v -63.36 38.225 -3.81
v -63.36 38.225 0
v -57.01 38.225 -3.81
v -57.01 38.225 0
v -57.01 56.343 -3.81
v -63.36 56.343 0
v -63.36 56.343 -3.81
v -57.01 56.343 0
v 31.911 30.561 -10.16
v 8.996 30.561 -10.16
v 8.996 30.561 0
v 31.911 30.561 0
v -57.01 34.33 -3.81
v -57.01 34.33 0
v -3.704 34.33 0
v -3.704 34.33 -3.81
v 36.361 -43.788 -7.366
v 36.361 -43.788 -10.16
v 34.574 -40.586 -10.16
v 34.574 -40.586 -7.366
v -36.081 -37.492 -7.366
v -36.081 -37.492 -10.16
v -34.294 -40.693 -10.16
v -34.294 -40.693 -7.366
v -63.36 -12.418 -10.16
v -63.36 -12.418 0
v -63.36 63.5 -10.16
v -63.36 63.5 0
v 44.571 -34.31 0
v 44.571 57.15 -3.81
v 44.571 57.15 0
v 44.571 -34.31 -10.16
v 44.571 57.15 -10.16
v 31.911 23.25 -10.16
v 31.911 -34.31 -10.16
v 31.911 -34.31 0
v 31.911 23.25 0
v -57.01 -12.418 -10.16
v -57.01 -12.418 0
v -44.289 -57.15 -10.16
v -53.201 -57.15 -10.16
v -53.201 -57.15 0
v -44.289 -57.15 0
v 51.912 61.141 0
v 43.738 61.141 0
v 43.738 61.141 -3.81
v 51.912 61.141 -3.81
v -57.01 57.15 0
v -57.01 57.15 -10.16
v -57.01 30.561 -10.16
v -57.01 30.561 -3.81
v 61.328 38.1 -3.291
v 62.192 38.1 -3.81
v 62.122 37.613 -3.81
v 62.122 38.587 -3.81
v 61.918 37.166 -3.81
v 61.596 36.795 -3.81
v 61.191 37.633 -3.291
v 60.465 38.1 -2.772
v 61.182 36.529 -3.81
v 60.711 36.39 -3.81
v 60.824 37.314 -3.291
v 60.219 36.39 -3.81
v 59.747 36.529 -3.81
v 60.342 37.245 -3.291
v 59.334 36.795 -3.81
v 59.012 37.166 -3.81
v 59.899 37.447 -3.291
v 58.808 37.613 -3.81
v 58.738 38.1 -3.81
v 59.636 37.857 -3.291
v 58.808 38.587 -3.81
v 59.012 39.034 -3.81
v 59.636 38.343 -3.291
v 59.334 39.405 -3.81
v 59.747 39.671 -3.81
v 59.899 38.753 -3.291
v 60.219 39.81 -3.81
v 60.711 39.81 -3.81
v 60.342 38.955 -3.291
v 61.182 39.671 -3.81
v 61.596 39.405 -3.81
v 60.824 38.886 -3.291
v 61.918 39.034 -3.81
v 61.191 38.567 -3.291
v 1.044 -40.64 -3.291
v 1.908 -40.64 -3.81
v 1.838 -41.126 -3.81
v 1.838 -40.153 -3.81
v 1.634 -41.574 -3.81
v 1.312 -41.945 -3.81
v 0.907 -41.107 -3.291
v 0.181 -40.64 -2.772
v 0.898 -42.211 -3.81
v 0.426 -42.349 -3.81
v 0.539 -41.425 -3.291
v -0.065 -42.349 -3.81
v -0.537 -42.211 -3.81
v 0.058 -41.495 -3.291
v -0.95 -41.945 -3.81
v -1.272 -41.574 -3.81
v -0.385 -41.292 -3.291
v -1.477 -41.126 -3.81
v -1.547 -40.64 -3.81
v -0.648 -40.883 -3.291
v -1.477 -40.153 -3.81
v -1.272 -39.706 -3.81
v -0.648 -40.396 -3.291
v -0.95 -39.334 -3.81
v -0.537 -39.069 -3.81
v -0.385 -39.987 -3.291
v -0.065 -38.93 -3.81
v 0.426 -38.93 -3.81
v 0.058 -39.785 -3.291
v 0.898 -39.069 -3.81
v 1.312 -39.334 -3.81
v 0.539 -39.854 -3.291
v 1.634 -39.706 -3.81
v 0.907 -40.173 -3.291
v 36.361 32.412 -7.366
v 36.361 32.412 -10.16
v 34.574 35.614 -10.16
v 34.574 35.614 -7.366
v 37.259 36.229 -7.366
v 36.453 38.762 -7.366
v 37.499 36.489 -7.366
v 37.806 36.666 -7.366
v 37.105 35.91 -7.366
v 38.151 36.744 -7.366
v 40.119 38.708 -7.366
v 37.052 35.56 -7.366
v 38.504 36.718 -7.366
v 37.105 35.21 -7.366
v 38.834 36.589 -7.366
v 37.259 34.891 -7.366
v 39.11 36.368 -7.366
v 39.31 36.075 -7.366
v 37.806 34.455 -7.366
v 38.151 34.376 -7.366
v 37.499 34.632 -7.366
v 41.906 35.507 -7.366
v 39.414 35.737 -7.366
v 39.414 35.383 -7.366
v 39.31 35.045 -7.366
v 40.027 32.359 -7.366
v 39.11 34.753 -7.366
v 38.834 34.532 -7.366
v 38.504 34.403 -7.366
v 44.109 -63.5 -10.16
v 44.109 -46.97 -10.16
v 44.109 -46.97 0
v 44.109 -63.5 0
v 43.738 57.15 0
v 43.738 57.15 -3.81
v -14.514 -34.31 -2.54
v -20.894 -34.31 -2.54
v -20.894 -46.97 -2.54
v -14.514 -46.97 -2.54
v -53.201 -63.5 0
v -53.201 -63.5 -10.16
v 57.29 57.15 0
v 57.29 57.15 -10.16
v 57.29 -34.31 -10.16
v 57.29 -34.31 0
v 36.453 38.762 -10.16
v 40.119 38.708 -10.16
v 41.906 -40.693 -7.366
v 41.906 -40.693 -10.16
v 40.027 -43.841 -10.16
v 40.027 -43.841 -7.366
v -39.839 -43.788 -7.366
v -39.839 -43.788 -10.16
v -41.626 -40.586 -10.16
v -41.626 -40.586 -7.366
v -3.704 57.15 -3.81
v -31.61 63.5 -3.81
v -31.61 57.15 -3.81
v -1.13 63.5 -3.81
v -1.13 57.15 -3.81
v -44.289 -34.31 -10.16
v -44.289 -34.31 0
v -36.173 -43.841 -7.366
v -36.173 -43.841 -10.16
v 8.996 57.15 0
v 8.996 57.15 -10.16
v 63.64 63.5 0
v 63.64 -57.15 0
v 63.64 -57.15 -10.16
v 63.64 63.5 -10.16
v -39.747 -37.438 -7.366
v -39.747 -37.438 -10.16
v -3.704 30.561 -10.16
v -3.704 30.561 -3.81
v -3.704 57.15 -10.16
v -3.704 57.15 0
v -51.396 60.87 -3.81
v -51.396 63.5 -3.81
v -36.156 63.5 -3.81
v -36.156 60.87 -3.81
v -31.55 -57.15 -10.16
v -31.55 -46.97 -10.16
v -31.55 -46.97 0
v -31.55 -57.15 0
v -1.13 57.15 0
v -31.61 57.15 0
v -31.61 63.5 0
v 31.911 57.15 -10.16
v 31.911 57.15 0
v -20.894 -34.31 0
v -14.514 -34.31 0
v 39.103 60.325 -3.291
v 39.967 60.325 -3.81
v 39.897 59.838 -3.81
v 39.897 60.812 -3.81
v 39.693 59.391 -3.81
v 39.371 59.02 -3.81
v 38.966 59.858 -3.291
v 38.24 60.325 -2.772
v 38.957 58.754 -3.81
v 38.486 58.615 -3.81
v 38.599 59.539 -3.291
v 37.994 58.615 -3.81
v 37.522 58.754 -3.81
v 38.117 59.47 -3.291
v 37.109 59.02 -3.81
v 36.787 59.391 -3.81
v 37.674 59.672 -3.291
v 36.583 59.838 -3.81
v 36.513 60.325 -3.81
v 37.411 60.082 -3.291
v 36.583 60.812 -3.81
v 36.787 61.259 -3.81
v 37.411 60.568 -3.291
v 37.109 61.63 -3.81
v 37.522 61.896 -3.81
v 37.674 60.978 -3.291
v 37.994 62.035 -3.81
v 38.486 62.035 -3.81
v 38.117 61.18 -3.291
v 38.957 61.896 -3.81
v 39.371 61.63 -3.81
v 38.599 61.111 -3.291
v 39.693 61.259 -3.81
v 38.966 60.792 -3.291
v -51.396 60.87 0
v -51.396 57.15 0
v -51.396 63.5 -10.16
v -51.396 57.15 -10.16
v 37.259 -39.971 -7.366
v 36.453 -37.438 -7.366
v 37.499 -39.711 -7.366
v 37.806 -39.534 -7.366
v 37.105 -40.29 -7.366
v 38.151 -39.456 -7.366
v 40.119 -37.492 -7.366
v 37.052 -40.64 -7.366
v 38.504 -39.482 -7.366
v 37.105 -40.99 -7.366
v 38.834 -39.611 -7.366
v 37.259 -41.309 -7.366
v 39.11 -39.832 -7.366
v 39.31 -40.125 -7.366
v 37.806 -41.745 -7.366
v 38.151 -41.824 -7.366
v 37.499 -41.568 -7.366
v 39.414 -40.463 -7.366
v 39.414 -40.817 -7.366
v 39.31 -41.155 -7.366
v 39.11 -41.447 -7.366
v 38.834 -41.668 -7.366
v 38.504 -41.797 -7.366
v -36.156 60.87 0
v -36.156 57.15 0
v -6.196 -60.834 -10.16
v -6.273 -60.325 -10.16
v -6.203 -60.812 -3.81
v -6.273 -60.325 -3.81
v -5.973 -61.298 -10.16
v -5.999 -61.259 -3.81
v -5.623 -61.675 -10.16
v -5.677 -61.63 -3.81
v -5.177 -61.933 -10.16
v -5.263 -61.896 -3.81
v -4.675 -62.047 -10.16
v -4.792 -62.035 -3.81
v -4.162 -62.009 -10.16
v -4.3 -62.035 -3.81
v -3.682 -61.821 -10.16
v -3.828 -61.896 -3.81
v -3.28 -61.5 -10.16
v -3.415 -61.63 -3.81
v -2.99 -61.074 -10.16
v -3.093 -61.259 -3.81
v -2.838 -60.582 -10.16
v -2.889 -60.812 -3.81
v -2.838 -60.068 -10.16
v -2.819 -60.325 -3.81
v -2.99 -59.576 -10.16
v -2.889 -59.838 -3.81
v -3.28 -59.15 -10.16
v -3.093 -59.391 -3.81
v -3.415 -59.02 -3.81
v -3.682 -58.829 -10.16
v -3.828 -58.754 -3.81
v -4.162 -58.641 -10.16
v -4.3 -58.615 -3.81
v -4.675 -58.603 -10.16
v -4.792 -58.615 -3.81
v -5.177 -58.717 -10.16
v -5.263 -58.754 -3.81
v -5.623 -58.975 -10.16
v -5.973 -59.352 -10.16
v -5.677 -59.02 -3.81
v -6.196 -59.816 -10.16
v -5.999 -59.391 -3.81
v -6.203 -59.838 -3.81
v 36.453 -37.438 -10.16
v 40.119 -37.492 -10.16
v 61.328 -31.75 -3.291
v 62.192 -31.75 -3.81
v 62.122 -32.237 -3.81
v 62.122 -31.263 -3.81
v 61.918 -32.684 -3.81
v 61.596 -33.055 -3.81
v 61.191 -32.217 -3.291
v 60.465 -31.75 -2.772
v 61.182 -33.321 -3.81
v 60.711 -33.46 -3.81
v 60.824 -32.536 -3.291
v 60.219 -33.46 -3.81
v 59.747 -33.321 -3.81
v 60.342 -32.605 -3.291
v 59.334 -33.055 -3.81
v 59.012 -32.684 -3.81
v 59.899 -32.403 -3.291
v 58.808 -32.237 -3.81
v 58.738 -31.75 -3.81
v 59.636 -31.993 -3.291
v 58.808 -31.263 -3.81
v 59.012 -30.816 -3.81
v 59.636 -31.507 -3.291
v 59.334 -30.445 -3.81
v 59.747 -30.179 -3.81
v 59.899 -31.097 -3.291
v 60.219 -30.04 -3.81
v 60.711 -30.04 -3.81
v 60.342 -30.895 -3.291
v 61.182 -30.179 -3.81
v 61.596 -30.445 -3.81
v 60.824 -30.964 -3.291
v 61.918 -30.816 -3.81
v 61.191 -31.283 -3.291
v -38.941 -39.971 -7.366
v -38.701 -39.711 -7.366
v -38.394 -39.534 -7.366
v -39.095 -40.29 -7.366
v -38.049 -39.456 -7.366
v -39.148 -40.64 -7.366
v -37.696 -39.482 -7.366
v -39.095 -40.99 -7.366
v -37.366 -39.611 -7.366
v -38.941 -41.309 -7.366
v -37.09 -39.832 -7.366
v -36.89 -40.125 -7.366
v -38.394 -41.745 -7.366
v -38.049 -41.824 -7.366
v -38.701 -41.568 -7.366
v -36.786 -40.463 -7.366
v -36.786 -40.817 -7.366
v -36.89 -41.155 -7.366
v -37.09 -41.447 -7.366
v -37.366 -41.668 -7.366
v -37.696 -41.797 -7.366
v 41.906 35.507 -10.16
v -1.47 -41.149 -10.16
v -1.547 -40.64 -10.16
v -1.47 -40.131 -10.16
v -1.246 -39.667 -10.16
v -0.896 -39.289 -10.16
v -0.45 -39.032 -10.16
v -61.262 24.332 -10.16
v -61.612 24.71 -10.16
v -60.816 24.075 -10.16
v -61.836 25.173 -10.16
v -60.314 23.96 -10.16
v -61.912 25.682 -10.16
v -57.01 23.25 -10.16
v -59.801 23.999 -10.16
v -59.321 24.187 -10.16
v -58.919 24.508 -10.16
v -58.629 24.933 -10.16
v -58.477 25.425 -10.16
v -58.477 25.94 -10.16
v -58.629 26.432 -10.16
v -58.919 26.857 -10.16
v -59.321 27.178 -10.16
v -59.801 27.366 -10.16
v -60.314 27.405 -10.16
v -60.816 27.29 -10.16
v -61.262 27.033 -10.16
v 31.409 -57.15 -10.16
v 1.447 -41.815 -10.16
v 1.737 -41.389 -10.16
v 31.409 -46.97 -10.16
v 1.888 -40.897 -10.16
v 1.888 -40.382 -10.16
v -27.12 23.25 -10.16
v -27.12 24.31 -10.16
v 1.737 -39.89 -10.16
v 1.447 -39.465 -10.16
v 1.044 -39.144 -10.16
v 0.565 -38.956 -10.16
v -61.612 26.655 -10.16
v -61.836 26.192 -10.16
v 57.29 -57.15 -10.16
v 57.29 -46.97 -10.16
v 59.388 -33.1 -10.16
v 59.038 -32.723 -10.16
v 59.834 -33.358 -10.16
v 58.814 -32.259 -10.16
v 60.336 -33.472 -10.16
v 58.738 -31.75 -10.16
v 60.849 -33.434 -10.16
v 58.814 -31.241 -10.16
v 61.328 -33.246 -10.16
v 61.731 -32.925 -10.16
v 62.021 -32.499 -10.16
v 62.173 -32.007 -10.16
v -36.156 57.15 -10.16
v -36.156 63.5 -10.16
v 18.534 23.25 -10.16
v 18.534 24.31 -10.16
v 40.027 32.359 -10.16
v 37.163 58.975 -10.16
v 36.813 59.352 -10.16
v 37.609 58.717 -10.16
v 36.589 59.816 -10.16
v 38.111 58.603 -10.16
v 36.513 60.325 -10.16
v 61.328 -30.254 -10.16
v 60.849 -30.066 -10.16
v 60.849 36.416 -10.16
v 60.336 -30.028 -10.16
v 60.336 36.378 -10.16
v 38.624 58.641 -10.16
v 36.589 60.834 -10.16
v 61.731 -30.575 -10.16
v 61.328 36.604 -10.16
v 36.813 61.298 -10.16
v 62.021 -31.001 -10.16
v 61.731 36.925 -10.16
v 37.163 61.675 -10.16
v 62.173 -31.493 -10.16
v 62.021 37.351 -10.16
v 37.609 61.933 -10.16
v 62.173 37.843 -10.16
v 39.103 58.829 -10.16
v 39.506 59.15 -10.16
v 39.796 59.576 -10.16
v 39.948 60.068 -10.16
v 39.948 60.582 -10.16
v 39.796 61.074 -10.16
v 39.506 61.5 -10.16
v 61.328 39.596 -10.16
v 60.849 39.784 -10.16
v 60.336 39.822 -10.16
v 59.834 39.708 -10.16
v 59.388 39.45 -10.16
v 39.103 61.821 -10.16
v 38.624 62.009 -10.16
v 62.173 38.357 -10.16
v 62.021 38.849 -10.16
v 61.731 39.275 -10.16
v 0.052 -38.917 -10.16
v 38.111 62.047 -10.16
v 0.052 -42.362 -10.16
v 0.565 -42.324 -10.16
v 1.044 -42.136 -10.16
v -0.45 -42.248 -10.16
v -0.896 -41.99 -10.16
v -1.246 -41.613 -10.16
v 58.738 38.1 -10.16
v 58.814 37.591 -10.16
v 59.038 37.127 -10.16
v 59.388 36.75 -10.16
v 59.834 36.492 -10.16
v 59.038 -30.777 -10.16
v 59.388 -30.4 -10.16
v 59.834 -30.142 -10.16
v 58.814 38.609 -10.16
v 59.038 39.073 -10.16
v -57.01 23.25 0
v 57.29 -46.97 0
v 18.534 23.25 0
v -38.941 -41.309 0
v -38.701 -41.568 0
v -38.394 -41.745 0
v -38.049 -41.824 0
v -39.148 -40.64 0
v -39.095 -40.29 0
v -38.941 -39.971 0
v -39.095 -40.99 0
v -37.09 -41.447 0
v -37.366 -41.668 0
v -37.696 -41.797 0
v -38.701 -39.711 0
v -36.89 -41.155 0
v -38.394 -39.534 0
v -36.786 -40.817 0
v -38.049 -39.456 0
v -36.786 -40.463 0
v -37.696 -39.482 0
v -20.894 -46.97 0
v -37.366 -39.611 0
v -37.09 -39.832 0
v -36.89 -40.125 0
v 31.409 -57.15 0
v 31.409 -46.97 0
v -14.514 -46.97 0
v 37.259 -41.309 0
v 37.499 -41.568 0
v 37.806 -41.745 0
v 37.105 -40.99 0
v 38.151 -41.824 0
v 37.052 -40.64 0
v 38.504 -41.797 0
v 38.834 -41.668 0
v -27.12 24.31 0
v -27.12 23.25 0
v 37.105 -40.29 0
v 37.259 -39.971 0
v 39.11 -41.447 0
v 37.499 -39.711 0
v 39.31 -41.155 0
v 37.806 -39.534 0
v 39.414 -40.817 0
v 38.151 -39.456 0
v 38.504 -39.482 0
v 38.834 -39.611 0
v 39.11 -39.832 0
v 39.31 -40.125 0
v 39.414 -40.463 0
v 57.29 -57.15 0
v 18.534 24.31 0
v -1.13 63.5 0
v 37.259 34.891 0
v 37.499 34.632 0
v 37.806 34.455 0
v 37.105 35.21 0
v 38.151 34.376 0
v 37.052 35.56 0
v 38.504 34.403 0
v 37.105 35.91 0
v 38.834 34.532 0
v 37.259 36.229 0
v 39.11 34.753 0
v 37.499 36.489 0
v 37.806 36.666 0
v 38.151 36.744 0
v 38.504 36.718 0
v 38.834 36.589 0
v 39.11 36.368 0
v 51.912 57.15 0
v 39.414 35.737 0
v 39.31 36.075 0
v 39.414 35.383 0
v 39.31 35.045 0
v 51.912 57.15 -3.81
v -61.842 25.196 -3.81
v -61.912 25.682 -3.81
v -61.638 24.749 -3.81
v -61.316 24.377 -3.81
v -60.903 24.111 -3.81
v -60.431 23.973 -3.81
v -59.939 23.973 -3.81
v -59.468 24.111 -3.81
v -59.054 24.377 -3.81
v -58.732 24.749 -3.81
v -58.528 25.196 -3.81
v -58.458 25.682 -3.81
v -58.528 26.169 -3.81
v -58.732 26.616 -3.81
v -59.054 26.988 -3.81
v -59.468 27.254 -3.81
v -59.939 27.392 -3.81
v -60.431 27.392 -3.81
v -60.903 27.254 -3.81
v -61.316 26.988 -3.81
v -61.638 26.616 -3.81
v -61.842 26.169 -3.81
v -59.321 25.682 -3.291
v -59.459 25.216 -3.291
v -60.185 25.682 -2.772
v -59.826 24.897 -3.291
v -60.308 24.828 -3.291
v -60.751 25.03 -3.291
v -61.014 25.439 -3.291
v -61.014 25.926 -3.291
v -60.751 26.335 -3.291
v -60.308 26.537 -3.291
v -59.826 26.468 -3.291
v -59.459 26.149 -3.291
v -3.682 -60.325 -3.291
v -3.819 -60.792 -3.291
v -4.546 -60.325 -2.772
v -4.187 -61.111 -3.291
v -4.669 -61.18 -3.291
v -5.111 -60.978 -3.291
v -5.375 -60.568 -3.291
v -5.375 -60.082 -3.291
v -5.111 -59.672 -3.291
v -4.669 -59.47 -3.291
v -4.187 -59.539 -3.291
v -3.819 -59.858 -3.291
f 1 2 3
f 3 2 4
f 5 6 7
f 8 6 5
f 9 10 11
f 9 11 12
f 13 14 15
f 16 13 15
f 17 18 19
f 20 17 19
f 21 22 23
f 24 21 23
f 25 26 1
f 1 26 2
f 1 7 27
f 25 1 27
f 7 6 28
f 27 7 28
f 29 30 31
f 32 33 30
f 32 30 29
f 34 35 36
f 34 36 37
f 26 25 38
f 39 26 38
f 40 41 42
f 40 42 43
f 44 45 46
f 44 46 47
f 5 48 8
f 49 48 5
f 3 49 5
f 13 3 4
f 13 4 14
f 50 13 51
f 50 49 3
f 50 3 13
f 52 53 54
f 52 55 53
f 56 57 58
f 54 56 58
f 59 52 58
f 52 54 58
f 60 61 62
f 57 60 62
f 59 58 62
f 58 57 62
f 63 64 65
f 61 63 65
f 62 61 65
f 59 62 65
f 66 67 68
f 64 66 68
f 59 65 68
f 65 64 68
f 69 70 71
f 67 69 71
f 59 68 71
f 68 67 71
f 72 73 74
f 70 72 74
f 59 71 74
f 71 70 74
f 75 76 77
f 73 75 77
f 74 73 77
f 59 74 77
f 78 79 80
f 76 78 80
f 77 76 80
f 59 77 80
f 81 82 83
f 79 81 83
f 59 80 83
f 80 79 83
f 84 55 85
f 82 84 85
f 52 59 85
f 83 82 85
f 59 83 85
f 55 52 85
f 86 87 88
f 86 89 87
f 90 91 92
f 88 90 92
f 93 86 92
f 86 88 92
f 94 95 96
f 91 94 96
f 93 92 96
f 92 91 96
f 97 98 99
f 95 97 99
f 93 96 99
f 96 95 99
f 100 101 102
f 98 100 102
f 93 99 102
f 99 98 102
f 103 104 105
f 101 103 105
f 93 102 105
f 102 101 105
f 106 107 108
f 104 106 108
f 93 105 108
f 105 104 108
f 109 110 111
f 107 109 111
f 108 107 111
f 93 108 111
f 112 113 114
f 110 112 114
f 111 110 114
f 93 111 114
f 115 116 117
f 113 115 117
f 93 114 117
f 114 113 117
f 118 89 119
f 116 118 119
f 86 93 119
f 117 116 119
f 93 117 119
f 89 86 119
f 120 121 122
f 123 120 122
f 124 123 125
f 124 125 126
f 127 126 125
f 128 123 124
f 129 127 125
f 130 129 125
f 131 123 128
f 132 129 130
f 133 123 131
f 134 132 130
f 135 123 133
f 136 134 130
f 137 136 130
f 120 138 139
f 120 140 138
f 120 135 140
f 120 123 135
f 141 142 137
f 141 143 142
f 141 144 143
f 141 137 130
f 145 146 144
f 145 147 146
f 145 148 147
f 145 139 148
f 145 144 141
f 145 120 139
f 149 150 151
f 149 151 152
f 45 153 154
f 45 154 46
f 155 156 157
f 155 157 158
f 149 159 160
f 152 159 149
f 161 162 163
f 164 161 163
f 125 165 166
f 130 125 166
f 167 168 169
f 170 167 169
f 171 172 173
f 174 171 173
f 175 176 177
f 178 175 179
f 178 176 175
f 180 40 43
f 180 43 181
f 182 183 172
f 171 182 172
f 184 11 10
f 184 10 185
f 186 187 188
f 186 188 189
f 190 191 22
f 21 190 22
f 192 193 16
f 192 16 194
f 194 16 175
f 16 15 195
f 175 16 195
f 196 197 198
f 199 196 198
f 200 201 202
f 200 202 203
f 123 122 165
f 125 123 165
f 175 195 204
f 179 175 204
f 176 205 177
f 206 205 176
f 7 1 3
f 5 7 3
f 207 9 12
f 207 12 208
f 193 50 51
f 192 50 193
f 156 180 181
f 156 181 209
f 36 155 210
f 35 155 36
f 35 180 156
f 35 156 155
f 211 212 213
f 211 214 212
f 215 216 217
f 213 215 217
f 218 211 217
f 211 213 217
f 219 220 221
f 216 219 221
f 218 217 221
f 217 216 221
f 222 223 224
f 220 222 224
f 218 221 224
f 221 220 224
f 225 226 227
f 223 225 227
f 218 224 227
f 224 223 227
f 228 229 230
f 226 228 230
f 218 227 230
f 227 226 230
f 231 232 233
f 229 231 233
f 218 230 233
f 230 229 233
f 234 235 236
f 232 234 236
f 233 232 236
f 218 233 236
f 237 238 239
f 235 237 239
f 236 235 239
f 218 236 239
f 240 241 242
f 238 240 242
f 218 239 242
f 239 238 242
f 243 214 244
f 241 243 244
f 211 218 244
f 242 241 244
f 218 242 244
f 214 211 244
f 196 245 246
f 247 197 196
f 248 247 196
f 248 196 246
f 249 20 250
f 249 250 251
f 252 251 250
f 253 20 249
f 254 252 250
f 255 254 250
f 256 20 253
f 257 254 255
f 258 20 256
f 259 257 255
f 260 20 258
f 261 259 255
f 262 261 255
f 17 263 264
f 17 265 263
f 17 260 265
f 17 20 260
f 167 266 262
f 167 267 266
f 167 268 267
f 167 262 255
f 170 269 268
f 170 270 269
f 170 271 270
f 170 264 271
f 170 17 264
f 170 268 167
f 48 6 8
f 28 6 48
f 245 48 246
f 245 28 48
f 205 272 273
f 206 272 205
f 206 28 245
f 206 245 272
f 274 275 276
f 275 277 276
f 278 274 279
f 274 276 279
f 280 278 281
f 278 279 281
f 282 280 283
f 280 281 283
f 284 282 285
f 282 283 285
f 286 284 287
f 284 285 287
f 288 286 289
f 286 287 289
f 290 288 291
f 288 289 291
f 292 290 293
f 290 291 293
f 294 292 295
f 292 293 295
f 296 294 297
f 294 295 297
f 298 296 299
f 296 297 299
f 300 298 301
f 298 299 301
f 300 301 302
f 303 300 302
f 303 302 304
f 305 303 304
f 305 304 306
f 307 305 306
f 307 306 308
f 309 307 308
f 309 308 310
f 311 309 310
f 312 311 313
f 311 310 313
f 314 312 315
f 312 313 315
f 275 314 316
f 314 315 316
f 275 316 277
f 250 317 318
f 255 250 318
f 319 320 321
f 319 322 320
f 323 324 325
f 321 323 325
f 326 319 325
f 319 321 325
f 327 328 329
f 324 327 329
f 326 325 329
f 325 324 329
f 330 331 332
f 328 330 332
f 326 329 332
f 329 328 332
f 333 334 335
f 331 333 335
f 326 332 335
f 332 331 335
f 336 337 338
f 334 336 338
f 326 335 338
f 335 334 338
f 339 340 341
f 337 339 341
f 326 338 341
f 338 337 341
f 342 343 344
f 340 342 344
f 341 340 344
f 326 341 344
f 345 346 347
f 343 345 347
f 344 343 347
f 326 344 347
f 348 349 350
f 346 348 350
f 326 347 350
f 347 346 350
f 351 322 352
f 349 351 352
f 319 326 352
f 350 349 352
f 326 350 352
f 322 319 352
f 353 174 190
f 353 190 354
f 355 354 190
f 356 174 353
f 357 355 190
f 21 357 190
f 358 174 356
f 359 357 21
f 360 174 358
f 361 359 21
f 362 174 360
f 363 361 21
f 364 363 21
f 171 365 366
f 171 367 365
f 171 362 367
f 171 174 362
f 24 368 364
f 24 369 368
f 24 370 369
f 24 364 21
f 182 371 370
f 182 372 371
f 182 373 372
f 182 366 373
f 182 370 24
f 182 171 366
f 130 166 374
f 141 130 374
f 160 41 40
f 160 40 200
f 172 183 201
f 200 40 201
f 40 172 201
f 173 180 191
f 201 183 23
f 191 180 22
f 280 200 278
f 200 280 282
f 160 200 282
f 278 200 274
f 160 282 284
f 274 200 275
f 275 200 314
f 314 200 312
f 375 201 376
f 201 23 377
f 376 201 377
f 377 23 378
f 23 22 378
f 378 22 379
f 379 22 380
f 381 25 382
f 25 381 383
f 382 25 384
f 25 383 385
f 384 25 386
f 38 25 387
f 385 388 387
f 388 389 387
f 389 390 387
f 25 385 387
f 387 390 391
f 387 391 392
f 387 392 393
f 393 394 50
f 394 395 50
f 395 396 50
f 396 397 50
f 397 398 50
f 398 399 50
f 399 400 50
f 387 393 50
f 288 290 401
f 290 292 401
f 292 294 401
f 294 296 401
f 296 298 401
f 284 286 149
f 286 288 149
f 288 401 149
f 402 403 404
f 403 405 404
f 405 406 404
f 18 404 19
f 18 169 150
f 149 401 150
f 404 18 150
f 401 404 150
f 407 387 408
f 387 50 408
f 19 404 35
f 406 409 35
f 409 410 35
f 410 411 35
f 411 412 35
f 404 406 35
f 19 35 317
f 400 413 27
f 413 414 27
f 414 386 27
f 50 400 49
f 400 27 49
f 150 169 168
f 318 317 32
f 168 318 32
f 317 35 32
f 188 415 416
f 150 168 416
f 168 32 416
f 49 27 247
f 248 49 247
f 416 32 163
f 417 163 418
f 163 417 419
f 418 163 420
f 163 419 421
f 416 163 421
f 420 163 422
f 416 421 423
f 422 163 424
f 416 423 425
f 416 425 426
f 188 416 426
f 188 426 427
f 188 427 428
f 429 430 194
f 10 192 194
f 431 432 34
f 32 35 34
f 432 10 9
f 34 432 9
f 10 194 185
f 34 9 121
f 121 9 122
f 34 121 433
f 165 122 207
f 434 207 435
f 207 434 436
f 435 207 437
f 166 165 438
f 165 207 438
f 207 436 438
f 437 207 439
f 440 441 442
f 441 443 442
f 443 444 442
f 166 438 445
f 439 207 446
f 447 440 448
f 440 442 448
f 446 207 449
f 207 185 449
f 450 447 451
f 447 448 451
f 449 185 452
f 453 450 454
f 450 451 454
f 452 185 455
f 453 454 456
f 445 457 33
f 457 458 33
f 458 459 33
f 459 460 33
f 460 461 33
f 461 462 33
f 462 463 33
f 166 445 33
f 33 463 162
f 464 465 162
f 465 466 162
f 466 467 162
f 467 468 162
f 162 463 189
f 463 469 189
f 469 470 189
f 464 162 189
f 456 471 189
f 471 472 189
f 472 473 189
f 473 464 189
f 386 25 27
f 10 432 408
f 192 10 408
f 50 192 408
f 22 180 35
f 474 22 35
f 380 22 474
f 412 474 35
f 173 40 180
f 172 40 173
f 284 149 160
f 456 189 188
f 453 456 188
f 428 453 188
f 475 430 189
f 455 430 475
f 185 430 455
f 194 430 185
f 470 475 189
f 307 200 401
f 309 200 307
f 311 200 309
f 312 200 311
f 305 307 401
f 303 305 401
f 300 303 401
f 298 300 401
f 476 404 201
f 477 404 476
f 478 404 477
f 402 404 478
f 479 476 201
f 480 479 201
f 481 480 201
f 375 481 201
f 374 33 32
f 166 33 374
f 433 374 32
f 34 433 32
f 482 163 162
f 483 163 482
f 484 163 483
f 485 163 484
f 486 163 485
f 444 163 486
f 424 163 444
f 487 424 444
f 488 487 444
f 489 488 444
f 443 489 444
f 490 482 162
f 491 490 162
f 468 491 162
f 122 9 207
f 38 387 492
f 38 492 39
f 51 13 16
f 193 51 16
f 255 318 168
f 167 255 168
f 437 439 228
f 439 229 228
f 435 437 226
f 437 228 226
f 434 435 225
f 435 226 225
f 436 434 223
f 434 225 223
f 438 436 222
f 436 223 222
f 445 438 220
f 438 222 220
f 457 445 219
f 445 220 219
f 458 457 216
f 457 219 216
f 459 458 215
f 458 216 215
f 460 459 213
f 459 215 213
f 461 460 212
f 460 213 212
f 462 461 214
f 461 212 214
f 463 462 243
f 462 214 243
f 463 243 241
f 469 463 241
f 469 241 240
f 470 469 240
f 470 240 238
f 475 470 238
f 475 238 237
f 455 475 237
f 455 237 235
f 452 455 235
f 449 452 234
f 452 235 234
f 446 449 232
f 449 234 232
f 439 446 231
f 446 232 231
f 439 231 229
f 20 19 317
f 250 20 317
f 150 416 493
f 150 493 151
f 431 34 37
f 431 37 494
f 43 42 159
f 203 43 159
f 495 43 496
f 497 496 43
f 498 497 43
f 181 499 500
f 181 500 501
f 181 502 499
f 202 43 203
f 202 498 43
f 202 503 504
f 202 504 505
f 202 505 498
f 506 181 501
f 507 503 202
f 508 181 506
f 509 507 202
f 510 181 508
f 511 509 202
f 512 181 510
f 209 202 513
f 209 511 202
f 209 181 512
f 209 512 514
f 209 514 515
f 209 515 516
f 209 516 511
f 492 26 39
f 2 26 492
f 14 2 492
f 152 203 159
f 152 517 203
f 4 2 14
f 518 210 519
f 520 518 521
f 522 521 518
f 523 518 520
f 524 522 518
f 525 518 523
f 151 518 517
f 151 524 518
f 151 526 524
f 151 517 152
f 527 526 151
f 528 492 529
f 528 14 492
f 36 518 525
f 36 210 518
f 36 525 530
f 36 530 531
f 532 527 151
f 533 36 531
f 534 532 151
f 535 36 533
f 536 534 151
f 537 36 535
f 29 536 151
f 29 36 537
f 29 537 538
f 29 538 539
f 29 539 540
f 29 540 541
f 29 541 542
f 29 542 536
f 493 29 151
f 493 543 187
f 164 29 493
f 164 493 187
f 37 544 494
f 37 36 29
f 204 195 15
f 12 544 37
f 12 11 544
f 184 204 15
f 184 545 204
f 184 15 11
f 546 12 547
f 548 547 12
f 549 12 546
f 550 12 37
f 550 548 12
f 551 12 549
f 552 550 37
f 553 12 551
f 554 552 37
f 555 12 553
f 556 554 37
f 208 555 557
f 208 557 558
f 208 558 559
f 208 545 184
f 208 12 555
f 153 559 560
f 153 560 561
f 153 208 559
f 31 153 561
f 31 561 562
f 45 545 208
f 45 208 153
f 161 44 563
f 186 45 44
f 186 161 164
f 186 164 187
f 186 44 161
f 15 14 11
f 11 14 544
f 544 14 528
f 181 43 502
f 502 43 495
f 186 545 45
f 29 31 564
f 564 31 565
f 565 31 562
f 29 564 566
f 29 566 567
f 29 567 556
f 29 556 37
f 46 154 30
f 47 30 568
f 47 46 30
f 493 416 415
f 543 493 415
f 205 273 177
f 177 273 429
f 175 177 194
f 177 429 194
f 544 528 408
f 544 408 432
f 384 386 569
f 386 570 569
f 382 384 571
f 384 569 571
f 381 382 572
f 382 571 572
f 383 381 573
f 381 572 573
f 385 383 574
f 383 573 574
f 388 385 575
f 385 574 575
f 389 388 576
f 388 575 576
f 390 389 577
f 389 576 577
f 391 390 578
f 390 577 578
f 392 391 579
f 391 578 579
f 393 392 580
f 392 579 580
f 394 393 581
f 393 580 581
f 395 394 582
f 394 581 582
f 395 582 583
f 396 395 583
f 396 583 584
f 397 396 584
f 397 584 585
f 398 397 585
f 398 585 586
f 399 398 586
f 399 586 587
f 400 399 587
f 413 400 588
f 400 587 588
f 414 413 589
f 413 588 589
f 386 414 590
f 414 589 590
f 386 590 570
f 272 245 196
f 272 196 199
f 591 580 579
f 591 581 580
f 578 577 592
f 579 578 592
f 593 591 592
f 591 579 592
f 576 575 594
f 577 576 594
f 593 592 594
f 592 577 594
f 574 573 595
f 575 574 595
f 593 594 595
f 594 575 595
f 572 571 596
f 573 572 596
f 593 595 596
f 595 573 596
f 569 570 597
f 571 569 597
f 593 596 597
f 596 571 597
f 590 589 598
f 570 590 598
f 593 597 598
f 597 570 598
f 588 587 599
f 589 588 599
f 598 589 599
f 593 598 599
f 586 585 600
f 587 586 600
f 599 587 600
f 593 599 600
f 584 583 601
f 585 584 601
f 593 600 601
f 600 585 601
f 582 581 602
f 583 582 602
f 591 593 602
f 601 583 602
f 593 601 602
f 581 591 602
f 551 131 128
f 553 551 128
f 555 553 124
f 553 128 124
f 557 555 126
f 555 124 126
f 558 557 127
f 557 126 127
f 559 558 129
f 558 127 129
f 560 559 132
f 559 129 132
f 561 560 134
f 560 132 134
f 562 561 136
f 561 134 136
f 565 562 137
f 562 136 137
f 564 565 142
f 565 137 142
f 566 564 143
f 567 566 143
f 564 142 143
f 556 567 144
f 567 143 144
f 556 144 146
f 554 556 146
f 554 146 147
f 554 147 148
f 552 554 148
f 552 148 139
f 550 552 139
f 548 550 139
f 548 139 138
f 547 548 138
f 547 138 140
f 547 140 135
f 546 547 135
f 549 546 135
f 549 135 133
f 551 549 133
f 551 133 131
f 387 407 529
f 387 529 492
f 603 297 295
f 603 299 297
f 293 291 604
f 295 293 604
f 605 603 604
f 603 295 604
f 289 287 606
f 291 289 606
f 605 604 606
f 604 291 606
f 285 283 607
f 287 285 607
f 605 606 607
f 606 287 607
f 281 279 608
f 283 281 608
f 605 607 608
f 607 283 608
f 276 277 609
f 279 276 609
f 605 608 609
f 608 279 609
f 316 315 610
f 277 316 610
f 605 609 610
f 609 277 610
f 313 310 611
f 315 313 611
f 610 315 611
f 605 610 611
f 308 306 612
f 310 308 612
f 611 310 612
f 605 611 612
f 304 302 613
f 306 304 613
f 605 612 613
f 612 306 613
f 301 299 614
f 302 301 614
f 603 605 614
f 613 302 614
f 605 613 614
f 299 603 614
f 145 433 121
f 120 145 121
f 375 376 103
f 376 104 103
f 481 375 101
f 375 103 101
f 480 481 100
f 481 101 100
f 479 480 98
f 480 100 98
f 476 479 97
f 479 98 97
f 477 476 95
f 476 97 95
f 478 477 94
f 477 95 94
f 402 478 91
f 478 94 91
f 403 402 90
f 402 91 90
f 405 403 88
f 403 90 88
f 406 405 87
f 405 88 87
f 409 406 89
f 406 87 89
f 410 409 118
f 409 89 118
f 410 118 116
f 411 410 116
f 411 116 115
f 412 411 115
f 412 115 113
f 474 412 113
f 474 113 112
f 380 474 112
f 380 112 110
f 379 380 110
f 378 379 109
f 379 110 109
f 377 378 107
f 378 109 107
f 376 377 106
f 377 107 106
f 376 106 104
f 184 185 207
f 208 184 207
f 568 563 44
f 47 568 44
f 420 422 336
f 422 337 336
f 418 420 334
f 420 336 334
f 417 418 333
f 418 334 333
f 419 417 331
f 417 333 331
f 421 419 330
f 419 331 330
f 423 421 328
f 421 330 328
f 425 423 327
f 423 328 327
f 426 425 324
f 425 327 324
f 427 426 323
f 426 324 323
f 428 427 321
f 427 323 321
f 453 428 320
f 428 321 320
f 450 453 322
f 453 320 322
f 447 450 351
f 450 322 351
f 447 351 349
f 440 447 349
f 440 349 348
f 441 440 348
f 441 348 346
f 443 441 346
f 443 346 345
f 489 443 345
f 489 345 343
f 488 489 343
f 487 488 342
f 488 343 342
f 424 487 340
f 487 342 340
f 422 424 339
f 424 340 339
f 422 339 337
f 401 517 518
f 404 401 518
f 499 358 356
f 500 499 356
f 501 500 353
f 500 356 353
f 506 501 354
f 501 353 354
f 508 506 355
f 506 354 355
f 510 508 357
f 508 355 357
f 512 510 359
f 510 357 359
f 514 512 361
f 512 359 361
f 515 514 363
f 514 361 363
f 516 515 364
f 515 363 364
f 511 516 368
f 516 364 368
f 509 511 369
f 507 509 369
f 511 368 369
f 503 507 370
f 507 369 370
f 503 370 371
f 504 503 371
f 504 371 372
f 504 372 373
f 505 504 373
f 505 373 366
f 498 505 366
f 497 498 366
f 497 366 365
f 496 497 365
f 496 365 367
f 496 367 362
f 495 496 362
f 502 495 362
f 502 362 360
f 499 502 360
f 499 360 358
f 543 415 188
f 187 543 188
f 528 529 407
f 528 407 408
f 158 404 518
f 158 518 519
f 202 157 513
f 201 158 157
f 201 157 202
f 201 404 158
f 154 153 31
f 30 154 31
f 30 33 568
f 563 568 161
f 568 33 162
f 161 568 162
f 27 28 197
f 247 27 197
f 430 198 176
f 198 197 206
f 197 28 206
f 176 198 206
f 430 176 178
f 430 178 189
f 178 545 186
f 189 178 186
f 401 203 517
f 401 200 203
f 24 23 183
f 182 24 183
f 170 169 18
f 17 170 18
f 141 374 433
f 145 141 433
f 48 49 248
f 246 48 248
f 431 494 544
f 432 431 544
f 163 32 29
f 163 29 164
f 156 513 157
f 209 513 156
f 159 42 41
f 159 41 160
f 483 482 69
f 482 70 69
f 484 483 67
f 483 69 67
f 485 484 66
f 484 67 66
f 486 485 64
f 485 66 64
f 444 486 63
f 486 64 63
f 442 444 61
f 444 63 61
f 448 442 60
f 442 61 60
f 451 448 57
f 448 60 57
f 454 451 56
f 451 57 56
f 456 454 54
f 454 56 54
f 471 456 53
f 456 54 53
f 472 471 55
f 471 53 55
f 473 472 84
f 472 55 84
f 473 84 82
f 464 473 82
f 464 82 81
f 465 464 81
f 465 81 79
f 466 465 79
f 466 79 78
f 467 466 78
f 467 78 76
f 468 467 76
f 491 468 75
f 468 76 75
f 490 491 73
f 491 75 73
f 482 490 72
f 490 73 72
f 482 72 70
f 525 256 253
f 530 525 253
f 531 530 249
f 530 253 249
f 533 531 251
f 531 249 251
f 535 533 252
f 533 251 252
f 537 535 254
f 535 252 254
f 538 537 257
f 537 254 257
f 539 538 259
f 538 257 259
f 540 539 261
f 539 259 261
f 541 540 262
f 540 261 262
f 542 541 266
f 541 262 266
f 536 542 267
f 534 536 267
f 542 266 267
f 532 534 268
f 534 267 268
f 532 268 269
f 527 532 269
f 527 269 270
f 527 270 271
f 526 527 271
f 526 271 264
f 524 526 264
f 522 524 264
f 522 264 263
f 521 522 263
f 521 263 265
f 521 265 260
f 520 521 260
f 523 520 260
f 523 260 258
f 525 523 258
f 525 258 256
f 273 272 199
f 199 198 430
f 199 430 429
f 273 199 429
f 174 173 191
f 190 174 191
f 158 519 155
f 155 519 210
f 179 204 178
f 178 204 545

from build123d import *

# Parameters (mm, degrees)
F1_W      = 126.9999492
F1_H      = 127.0000508
F2_DEPTH  = 10.16
F3_W      = 114.2999492
F3_H      = 114.3000508
F4_DEPTH  = 10.161
F5_W      = 10.4391968
F5_H      = 51.0824988
F5_W_2    = 15.240254
F5_H_2    = 6.35
F5_W_3    = 19.531076
F6_DEPTH  = 10.161
F7_W      = 6.3186603262
F7_H      = 12.6597918
F8_DEPTH  = 10.16
F10_D     = 2.3749
F11_R     = 1.18745
F12_DEPTH = 2.794
F15_W     = 12.7
F15_H     = 26.589482
F16_DEPTH = 10.16
F15_H_2   = 10.1803962
F18_D     = 3.4544
F18_DEPTH = 6.35
F18_TIP   = 1.0378064612
F9_W      = 6.35
F9_H      = 18.117566
F9_W_2    = 30.48
F9_H_2    = 6.35
F9_W_3    = 8.1742328233
F9_H_3    = 3.990848
F19_DEPTH = 3.81
F20_W     = 45.6544562851
F20_H     = 1.059942
F21_DEPTH = 10.161
F22_W     = 53.3058220283
F22_H     = 3.769614
F22_W_2   = 15.240254
F22_H_2   = 2.629916
F23_DEPTH = 3.81
F24_W     = 6.379972
F24_H     = 12.6597918
F25_DEPTH = 2.54


# Not quite as in the source:
# - a feature names something its author has since deleted; it is built from what else it names


with BuildPart() as f2:
    # F1 (on Top) → F2 (new body)
    with BuildSketch(Plane.XY):
        with Locations((0.1398778, 0)):
            Rectangle(F1_W, F1_H)
    extrude(amount=-F2_DEPTH)

    # F3 (on face) → F4 (cut, through all)
    with BuildSketch(Plane(origin=(0, 0, -10.16), x_dir=(1, 0, 0), z_dir=(0, 0, -1))):
        with Locations((0.1398778, 0)):
            Rectangle(F3_W, F3_H)
    extrude(amount=-F4_DEPTH, mode=Mode.SUBTRACT)

    # F5 (on face) → F6 (cut, through all)
    with BuildSketch(Plane(origin=(0, 0, -10.16), x_dir=(1, 0, 0), z_dir=(0, 0, -1))):
        with Locations((-58.420254, 37.958776)):
            Rectangle(F5_W, F5_H)
        with Locations((-43.7761126, -60.3250254)):
            Rectangle(F5_W_2, F5_H_2)
        with Locations((53.8743144, 60.3250254)):
            Rectangle(F5_W_3, F5_H_2)
    extrude(amount=-F6_DEPTH, mode=Mode.SUBTRACT)


with BuildPart() as f8:
    # F7 (on face) → F8 (new body)
    with BuildSketch(Plane(origin=(0, 0, -10.16), x_dir=(1, 0, 0), z_dir=(0, 0, -1))):
        Polygon((-37.8689406421, 34.3098374), (-37.8689406421, 46.9696292), (-31.5502803159, 46.9696292), (-31.5502803159, 57.1500254), (-44.2886084, 57.1500254), (-44.2886084, 34.3098374), align=None)
        with Locations((-34.709610479, 40.6397333)):
            Rectangle(F7_W, F7_H)
        Polygon((57.2898524, 46.9696292), (-31.5502803159, 46.9696292), (-31.5502803159, 34.3098374), (31.9114424, 34.3098374), (44.5713104, 34.3098374), (57.2898524, 34.3098374), align=None)
        Polygon((44.5713104, 34.3098374), (31.9114424, 34.3098374), (31.9114424, -23.2499154), (31.9114424, -29.2427535486), (31.9114424, -30.5605434), (31.9114424, -41.8902134), (31.9114424, -57.1500254), (44.5713104, -57.1500254), align=None)
        Polygon((31.9114424, -29.2427535486), (31.9114424, -23.2499154), (-57.0100968, -23.2499154), (-57.0100968, -30.5605434), (31.9114424, -30.5605434), align=None)
    extrude(amount=-F8_DEPTH)

    # F10 (through all)
    with Locations(Plane.XY):
        with Locations((38.2398524, 35.5602794), (38.2398524, -40.639746), (-37.9601476, -40.639746)):
            Hole(F10_D / 2)

    # F11 (on face) → F12 (cut)
    with BuildSketch(Plane(origin=(0, 0, -10.16), x_dir=(1, 0, 0), z_dir=(0, 0, -1))):
        Polygon((-34.2943619493, 40.693121057), (-36.17347893, 43.8410970268), (-39.8392645806, 43.7877219698), (-41.6259332507, 40.586370943), (-39.74681627, 37.4383949732), (-36.0810306194, 37.4917700302), align=None)
        with Locations((-37.9601476, 40.639746)):
            Circle(F11_R, mode=Mode.SUBTRACT)
        Polygon((34.5740667493, 40.586370943), (36.45318373, 37.4383949732), (40.1189693806, 37.4917700302), (41.9056380507, 40.693121057), (40.02652107, 43.8410970268), (36.3607354194, 43.7877219698), align=None)
        Polygon((36.3607354194, -32.4123034302), (34.5740667493, -35.613654457), (36.45318373, -38.7616304268), (40.1189693806, -38.7082553698), (41.9056380507, -35.506904343), (40.02652107, -32.3589283732), align=None)
    extrude(amount=-F12_DEPTH, mode=Mode.SUBTRACT)

    # F14: union F2
    add(f2.part)


with BuildPart() as f16:
    # F15 (on face) → F16 (new body, through all)
    with BuildSketch(Plane.XY):
        with Locations((2.6457252283, 43.8552844)):
            Rectangle(F15_W, F15_H)
    extrude(amount=-F16_DEPTH)


with BuildPart() as f16b:
    # F15 (on face) → F16, piece 2 (new body, through all)
    with BuildSketch(Plane.XY):
        with Locations((37.7587764, -52.0598273)):
            Rectangle(F15_W, F15_H_2)
    extrude(amount=-F16_DEPTH)


with BuildPart() as f16_1:
    add(f16.part)

    # F17: union F16b, F8
    add(f16b.part)
    add(f8.part)

    # F18
    with Locations(Plane(origin=(0, 0, -10.16), x_dir=(1, 0, 0), z_dir=(0, 0, -1))):
        with Locations((0.1805810421, 40.6397333), (-4.5459396, 60.3250254), (-60.1850968, -25.6824734), (38.2398524, -60.3250254), (60.4648524, -38.1000254), (60.4648524, 31.7500254)):
            Hole(F18_D / 2, depth=F18_DEPTH)
            with Locations((0, 0, -(F18_DEPTH + F18_TIP / 2))):  # 118° drill point
                Cone(0, F18_D / 2, F18_TIP, mode=Mode.SUBTRACT)

    # F9 (on face) → F19 (cut)
    with BuildSketch(Plane.XY):
        with Locations((-60.1850968, 47.2840304)):
            Rectangle(F9_W, F9_H)
        with Locations((-16.3704016, 60.3250254)):
            Rectangle(F9_W_2, F9_H_2)
        with Locations((47.8253068116, 59.1454494)):
            Rectangle(F9_W_3, F9_H_3)
    extrude(amount=-F19_DEPTH, mode=Mode.SUBTRACT)

    # F20 (on face) → F21 (cut, through all)
    with BuildSketch(Plane.XY):
        with Locations((-4.2932037426, 23.7798864)):
            Rectangle(F20_W, F20_H)
    extrude(amount=-F21_DEPTH, mode=Mode.SUBTRACT)

    # F22 (on face) → F23 (join)
    with BuildSketch(Plane.XY):
        with Locations((-30.3571857859, 32.4453504)):
            Rectangle(F22_W, F22_H)
        with Locations((-43.7761126, 62.1850674)):
            Rectangle(F22_W_2, F22_H_2)
    extrude(amount=-F23_DEPTH)

    # F24 (on face) → F25 (cut)
    with BuildSketch(Plane.XY):
        with Locations((-17.7036476, -40.6397333)):
            Rectangle(F24_W, F24_H)
    extrude(amount=-F25_DEPTH, mode=Mode.SUBTRACT)


solid = f16_1.part
